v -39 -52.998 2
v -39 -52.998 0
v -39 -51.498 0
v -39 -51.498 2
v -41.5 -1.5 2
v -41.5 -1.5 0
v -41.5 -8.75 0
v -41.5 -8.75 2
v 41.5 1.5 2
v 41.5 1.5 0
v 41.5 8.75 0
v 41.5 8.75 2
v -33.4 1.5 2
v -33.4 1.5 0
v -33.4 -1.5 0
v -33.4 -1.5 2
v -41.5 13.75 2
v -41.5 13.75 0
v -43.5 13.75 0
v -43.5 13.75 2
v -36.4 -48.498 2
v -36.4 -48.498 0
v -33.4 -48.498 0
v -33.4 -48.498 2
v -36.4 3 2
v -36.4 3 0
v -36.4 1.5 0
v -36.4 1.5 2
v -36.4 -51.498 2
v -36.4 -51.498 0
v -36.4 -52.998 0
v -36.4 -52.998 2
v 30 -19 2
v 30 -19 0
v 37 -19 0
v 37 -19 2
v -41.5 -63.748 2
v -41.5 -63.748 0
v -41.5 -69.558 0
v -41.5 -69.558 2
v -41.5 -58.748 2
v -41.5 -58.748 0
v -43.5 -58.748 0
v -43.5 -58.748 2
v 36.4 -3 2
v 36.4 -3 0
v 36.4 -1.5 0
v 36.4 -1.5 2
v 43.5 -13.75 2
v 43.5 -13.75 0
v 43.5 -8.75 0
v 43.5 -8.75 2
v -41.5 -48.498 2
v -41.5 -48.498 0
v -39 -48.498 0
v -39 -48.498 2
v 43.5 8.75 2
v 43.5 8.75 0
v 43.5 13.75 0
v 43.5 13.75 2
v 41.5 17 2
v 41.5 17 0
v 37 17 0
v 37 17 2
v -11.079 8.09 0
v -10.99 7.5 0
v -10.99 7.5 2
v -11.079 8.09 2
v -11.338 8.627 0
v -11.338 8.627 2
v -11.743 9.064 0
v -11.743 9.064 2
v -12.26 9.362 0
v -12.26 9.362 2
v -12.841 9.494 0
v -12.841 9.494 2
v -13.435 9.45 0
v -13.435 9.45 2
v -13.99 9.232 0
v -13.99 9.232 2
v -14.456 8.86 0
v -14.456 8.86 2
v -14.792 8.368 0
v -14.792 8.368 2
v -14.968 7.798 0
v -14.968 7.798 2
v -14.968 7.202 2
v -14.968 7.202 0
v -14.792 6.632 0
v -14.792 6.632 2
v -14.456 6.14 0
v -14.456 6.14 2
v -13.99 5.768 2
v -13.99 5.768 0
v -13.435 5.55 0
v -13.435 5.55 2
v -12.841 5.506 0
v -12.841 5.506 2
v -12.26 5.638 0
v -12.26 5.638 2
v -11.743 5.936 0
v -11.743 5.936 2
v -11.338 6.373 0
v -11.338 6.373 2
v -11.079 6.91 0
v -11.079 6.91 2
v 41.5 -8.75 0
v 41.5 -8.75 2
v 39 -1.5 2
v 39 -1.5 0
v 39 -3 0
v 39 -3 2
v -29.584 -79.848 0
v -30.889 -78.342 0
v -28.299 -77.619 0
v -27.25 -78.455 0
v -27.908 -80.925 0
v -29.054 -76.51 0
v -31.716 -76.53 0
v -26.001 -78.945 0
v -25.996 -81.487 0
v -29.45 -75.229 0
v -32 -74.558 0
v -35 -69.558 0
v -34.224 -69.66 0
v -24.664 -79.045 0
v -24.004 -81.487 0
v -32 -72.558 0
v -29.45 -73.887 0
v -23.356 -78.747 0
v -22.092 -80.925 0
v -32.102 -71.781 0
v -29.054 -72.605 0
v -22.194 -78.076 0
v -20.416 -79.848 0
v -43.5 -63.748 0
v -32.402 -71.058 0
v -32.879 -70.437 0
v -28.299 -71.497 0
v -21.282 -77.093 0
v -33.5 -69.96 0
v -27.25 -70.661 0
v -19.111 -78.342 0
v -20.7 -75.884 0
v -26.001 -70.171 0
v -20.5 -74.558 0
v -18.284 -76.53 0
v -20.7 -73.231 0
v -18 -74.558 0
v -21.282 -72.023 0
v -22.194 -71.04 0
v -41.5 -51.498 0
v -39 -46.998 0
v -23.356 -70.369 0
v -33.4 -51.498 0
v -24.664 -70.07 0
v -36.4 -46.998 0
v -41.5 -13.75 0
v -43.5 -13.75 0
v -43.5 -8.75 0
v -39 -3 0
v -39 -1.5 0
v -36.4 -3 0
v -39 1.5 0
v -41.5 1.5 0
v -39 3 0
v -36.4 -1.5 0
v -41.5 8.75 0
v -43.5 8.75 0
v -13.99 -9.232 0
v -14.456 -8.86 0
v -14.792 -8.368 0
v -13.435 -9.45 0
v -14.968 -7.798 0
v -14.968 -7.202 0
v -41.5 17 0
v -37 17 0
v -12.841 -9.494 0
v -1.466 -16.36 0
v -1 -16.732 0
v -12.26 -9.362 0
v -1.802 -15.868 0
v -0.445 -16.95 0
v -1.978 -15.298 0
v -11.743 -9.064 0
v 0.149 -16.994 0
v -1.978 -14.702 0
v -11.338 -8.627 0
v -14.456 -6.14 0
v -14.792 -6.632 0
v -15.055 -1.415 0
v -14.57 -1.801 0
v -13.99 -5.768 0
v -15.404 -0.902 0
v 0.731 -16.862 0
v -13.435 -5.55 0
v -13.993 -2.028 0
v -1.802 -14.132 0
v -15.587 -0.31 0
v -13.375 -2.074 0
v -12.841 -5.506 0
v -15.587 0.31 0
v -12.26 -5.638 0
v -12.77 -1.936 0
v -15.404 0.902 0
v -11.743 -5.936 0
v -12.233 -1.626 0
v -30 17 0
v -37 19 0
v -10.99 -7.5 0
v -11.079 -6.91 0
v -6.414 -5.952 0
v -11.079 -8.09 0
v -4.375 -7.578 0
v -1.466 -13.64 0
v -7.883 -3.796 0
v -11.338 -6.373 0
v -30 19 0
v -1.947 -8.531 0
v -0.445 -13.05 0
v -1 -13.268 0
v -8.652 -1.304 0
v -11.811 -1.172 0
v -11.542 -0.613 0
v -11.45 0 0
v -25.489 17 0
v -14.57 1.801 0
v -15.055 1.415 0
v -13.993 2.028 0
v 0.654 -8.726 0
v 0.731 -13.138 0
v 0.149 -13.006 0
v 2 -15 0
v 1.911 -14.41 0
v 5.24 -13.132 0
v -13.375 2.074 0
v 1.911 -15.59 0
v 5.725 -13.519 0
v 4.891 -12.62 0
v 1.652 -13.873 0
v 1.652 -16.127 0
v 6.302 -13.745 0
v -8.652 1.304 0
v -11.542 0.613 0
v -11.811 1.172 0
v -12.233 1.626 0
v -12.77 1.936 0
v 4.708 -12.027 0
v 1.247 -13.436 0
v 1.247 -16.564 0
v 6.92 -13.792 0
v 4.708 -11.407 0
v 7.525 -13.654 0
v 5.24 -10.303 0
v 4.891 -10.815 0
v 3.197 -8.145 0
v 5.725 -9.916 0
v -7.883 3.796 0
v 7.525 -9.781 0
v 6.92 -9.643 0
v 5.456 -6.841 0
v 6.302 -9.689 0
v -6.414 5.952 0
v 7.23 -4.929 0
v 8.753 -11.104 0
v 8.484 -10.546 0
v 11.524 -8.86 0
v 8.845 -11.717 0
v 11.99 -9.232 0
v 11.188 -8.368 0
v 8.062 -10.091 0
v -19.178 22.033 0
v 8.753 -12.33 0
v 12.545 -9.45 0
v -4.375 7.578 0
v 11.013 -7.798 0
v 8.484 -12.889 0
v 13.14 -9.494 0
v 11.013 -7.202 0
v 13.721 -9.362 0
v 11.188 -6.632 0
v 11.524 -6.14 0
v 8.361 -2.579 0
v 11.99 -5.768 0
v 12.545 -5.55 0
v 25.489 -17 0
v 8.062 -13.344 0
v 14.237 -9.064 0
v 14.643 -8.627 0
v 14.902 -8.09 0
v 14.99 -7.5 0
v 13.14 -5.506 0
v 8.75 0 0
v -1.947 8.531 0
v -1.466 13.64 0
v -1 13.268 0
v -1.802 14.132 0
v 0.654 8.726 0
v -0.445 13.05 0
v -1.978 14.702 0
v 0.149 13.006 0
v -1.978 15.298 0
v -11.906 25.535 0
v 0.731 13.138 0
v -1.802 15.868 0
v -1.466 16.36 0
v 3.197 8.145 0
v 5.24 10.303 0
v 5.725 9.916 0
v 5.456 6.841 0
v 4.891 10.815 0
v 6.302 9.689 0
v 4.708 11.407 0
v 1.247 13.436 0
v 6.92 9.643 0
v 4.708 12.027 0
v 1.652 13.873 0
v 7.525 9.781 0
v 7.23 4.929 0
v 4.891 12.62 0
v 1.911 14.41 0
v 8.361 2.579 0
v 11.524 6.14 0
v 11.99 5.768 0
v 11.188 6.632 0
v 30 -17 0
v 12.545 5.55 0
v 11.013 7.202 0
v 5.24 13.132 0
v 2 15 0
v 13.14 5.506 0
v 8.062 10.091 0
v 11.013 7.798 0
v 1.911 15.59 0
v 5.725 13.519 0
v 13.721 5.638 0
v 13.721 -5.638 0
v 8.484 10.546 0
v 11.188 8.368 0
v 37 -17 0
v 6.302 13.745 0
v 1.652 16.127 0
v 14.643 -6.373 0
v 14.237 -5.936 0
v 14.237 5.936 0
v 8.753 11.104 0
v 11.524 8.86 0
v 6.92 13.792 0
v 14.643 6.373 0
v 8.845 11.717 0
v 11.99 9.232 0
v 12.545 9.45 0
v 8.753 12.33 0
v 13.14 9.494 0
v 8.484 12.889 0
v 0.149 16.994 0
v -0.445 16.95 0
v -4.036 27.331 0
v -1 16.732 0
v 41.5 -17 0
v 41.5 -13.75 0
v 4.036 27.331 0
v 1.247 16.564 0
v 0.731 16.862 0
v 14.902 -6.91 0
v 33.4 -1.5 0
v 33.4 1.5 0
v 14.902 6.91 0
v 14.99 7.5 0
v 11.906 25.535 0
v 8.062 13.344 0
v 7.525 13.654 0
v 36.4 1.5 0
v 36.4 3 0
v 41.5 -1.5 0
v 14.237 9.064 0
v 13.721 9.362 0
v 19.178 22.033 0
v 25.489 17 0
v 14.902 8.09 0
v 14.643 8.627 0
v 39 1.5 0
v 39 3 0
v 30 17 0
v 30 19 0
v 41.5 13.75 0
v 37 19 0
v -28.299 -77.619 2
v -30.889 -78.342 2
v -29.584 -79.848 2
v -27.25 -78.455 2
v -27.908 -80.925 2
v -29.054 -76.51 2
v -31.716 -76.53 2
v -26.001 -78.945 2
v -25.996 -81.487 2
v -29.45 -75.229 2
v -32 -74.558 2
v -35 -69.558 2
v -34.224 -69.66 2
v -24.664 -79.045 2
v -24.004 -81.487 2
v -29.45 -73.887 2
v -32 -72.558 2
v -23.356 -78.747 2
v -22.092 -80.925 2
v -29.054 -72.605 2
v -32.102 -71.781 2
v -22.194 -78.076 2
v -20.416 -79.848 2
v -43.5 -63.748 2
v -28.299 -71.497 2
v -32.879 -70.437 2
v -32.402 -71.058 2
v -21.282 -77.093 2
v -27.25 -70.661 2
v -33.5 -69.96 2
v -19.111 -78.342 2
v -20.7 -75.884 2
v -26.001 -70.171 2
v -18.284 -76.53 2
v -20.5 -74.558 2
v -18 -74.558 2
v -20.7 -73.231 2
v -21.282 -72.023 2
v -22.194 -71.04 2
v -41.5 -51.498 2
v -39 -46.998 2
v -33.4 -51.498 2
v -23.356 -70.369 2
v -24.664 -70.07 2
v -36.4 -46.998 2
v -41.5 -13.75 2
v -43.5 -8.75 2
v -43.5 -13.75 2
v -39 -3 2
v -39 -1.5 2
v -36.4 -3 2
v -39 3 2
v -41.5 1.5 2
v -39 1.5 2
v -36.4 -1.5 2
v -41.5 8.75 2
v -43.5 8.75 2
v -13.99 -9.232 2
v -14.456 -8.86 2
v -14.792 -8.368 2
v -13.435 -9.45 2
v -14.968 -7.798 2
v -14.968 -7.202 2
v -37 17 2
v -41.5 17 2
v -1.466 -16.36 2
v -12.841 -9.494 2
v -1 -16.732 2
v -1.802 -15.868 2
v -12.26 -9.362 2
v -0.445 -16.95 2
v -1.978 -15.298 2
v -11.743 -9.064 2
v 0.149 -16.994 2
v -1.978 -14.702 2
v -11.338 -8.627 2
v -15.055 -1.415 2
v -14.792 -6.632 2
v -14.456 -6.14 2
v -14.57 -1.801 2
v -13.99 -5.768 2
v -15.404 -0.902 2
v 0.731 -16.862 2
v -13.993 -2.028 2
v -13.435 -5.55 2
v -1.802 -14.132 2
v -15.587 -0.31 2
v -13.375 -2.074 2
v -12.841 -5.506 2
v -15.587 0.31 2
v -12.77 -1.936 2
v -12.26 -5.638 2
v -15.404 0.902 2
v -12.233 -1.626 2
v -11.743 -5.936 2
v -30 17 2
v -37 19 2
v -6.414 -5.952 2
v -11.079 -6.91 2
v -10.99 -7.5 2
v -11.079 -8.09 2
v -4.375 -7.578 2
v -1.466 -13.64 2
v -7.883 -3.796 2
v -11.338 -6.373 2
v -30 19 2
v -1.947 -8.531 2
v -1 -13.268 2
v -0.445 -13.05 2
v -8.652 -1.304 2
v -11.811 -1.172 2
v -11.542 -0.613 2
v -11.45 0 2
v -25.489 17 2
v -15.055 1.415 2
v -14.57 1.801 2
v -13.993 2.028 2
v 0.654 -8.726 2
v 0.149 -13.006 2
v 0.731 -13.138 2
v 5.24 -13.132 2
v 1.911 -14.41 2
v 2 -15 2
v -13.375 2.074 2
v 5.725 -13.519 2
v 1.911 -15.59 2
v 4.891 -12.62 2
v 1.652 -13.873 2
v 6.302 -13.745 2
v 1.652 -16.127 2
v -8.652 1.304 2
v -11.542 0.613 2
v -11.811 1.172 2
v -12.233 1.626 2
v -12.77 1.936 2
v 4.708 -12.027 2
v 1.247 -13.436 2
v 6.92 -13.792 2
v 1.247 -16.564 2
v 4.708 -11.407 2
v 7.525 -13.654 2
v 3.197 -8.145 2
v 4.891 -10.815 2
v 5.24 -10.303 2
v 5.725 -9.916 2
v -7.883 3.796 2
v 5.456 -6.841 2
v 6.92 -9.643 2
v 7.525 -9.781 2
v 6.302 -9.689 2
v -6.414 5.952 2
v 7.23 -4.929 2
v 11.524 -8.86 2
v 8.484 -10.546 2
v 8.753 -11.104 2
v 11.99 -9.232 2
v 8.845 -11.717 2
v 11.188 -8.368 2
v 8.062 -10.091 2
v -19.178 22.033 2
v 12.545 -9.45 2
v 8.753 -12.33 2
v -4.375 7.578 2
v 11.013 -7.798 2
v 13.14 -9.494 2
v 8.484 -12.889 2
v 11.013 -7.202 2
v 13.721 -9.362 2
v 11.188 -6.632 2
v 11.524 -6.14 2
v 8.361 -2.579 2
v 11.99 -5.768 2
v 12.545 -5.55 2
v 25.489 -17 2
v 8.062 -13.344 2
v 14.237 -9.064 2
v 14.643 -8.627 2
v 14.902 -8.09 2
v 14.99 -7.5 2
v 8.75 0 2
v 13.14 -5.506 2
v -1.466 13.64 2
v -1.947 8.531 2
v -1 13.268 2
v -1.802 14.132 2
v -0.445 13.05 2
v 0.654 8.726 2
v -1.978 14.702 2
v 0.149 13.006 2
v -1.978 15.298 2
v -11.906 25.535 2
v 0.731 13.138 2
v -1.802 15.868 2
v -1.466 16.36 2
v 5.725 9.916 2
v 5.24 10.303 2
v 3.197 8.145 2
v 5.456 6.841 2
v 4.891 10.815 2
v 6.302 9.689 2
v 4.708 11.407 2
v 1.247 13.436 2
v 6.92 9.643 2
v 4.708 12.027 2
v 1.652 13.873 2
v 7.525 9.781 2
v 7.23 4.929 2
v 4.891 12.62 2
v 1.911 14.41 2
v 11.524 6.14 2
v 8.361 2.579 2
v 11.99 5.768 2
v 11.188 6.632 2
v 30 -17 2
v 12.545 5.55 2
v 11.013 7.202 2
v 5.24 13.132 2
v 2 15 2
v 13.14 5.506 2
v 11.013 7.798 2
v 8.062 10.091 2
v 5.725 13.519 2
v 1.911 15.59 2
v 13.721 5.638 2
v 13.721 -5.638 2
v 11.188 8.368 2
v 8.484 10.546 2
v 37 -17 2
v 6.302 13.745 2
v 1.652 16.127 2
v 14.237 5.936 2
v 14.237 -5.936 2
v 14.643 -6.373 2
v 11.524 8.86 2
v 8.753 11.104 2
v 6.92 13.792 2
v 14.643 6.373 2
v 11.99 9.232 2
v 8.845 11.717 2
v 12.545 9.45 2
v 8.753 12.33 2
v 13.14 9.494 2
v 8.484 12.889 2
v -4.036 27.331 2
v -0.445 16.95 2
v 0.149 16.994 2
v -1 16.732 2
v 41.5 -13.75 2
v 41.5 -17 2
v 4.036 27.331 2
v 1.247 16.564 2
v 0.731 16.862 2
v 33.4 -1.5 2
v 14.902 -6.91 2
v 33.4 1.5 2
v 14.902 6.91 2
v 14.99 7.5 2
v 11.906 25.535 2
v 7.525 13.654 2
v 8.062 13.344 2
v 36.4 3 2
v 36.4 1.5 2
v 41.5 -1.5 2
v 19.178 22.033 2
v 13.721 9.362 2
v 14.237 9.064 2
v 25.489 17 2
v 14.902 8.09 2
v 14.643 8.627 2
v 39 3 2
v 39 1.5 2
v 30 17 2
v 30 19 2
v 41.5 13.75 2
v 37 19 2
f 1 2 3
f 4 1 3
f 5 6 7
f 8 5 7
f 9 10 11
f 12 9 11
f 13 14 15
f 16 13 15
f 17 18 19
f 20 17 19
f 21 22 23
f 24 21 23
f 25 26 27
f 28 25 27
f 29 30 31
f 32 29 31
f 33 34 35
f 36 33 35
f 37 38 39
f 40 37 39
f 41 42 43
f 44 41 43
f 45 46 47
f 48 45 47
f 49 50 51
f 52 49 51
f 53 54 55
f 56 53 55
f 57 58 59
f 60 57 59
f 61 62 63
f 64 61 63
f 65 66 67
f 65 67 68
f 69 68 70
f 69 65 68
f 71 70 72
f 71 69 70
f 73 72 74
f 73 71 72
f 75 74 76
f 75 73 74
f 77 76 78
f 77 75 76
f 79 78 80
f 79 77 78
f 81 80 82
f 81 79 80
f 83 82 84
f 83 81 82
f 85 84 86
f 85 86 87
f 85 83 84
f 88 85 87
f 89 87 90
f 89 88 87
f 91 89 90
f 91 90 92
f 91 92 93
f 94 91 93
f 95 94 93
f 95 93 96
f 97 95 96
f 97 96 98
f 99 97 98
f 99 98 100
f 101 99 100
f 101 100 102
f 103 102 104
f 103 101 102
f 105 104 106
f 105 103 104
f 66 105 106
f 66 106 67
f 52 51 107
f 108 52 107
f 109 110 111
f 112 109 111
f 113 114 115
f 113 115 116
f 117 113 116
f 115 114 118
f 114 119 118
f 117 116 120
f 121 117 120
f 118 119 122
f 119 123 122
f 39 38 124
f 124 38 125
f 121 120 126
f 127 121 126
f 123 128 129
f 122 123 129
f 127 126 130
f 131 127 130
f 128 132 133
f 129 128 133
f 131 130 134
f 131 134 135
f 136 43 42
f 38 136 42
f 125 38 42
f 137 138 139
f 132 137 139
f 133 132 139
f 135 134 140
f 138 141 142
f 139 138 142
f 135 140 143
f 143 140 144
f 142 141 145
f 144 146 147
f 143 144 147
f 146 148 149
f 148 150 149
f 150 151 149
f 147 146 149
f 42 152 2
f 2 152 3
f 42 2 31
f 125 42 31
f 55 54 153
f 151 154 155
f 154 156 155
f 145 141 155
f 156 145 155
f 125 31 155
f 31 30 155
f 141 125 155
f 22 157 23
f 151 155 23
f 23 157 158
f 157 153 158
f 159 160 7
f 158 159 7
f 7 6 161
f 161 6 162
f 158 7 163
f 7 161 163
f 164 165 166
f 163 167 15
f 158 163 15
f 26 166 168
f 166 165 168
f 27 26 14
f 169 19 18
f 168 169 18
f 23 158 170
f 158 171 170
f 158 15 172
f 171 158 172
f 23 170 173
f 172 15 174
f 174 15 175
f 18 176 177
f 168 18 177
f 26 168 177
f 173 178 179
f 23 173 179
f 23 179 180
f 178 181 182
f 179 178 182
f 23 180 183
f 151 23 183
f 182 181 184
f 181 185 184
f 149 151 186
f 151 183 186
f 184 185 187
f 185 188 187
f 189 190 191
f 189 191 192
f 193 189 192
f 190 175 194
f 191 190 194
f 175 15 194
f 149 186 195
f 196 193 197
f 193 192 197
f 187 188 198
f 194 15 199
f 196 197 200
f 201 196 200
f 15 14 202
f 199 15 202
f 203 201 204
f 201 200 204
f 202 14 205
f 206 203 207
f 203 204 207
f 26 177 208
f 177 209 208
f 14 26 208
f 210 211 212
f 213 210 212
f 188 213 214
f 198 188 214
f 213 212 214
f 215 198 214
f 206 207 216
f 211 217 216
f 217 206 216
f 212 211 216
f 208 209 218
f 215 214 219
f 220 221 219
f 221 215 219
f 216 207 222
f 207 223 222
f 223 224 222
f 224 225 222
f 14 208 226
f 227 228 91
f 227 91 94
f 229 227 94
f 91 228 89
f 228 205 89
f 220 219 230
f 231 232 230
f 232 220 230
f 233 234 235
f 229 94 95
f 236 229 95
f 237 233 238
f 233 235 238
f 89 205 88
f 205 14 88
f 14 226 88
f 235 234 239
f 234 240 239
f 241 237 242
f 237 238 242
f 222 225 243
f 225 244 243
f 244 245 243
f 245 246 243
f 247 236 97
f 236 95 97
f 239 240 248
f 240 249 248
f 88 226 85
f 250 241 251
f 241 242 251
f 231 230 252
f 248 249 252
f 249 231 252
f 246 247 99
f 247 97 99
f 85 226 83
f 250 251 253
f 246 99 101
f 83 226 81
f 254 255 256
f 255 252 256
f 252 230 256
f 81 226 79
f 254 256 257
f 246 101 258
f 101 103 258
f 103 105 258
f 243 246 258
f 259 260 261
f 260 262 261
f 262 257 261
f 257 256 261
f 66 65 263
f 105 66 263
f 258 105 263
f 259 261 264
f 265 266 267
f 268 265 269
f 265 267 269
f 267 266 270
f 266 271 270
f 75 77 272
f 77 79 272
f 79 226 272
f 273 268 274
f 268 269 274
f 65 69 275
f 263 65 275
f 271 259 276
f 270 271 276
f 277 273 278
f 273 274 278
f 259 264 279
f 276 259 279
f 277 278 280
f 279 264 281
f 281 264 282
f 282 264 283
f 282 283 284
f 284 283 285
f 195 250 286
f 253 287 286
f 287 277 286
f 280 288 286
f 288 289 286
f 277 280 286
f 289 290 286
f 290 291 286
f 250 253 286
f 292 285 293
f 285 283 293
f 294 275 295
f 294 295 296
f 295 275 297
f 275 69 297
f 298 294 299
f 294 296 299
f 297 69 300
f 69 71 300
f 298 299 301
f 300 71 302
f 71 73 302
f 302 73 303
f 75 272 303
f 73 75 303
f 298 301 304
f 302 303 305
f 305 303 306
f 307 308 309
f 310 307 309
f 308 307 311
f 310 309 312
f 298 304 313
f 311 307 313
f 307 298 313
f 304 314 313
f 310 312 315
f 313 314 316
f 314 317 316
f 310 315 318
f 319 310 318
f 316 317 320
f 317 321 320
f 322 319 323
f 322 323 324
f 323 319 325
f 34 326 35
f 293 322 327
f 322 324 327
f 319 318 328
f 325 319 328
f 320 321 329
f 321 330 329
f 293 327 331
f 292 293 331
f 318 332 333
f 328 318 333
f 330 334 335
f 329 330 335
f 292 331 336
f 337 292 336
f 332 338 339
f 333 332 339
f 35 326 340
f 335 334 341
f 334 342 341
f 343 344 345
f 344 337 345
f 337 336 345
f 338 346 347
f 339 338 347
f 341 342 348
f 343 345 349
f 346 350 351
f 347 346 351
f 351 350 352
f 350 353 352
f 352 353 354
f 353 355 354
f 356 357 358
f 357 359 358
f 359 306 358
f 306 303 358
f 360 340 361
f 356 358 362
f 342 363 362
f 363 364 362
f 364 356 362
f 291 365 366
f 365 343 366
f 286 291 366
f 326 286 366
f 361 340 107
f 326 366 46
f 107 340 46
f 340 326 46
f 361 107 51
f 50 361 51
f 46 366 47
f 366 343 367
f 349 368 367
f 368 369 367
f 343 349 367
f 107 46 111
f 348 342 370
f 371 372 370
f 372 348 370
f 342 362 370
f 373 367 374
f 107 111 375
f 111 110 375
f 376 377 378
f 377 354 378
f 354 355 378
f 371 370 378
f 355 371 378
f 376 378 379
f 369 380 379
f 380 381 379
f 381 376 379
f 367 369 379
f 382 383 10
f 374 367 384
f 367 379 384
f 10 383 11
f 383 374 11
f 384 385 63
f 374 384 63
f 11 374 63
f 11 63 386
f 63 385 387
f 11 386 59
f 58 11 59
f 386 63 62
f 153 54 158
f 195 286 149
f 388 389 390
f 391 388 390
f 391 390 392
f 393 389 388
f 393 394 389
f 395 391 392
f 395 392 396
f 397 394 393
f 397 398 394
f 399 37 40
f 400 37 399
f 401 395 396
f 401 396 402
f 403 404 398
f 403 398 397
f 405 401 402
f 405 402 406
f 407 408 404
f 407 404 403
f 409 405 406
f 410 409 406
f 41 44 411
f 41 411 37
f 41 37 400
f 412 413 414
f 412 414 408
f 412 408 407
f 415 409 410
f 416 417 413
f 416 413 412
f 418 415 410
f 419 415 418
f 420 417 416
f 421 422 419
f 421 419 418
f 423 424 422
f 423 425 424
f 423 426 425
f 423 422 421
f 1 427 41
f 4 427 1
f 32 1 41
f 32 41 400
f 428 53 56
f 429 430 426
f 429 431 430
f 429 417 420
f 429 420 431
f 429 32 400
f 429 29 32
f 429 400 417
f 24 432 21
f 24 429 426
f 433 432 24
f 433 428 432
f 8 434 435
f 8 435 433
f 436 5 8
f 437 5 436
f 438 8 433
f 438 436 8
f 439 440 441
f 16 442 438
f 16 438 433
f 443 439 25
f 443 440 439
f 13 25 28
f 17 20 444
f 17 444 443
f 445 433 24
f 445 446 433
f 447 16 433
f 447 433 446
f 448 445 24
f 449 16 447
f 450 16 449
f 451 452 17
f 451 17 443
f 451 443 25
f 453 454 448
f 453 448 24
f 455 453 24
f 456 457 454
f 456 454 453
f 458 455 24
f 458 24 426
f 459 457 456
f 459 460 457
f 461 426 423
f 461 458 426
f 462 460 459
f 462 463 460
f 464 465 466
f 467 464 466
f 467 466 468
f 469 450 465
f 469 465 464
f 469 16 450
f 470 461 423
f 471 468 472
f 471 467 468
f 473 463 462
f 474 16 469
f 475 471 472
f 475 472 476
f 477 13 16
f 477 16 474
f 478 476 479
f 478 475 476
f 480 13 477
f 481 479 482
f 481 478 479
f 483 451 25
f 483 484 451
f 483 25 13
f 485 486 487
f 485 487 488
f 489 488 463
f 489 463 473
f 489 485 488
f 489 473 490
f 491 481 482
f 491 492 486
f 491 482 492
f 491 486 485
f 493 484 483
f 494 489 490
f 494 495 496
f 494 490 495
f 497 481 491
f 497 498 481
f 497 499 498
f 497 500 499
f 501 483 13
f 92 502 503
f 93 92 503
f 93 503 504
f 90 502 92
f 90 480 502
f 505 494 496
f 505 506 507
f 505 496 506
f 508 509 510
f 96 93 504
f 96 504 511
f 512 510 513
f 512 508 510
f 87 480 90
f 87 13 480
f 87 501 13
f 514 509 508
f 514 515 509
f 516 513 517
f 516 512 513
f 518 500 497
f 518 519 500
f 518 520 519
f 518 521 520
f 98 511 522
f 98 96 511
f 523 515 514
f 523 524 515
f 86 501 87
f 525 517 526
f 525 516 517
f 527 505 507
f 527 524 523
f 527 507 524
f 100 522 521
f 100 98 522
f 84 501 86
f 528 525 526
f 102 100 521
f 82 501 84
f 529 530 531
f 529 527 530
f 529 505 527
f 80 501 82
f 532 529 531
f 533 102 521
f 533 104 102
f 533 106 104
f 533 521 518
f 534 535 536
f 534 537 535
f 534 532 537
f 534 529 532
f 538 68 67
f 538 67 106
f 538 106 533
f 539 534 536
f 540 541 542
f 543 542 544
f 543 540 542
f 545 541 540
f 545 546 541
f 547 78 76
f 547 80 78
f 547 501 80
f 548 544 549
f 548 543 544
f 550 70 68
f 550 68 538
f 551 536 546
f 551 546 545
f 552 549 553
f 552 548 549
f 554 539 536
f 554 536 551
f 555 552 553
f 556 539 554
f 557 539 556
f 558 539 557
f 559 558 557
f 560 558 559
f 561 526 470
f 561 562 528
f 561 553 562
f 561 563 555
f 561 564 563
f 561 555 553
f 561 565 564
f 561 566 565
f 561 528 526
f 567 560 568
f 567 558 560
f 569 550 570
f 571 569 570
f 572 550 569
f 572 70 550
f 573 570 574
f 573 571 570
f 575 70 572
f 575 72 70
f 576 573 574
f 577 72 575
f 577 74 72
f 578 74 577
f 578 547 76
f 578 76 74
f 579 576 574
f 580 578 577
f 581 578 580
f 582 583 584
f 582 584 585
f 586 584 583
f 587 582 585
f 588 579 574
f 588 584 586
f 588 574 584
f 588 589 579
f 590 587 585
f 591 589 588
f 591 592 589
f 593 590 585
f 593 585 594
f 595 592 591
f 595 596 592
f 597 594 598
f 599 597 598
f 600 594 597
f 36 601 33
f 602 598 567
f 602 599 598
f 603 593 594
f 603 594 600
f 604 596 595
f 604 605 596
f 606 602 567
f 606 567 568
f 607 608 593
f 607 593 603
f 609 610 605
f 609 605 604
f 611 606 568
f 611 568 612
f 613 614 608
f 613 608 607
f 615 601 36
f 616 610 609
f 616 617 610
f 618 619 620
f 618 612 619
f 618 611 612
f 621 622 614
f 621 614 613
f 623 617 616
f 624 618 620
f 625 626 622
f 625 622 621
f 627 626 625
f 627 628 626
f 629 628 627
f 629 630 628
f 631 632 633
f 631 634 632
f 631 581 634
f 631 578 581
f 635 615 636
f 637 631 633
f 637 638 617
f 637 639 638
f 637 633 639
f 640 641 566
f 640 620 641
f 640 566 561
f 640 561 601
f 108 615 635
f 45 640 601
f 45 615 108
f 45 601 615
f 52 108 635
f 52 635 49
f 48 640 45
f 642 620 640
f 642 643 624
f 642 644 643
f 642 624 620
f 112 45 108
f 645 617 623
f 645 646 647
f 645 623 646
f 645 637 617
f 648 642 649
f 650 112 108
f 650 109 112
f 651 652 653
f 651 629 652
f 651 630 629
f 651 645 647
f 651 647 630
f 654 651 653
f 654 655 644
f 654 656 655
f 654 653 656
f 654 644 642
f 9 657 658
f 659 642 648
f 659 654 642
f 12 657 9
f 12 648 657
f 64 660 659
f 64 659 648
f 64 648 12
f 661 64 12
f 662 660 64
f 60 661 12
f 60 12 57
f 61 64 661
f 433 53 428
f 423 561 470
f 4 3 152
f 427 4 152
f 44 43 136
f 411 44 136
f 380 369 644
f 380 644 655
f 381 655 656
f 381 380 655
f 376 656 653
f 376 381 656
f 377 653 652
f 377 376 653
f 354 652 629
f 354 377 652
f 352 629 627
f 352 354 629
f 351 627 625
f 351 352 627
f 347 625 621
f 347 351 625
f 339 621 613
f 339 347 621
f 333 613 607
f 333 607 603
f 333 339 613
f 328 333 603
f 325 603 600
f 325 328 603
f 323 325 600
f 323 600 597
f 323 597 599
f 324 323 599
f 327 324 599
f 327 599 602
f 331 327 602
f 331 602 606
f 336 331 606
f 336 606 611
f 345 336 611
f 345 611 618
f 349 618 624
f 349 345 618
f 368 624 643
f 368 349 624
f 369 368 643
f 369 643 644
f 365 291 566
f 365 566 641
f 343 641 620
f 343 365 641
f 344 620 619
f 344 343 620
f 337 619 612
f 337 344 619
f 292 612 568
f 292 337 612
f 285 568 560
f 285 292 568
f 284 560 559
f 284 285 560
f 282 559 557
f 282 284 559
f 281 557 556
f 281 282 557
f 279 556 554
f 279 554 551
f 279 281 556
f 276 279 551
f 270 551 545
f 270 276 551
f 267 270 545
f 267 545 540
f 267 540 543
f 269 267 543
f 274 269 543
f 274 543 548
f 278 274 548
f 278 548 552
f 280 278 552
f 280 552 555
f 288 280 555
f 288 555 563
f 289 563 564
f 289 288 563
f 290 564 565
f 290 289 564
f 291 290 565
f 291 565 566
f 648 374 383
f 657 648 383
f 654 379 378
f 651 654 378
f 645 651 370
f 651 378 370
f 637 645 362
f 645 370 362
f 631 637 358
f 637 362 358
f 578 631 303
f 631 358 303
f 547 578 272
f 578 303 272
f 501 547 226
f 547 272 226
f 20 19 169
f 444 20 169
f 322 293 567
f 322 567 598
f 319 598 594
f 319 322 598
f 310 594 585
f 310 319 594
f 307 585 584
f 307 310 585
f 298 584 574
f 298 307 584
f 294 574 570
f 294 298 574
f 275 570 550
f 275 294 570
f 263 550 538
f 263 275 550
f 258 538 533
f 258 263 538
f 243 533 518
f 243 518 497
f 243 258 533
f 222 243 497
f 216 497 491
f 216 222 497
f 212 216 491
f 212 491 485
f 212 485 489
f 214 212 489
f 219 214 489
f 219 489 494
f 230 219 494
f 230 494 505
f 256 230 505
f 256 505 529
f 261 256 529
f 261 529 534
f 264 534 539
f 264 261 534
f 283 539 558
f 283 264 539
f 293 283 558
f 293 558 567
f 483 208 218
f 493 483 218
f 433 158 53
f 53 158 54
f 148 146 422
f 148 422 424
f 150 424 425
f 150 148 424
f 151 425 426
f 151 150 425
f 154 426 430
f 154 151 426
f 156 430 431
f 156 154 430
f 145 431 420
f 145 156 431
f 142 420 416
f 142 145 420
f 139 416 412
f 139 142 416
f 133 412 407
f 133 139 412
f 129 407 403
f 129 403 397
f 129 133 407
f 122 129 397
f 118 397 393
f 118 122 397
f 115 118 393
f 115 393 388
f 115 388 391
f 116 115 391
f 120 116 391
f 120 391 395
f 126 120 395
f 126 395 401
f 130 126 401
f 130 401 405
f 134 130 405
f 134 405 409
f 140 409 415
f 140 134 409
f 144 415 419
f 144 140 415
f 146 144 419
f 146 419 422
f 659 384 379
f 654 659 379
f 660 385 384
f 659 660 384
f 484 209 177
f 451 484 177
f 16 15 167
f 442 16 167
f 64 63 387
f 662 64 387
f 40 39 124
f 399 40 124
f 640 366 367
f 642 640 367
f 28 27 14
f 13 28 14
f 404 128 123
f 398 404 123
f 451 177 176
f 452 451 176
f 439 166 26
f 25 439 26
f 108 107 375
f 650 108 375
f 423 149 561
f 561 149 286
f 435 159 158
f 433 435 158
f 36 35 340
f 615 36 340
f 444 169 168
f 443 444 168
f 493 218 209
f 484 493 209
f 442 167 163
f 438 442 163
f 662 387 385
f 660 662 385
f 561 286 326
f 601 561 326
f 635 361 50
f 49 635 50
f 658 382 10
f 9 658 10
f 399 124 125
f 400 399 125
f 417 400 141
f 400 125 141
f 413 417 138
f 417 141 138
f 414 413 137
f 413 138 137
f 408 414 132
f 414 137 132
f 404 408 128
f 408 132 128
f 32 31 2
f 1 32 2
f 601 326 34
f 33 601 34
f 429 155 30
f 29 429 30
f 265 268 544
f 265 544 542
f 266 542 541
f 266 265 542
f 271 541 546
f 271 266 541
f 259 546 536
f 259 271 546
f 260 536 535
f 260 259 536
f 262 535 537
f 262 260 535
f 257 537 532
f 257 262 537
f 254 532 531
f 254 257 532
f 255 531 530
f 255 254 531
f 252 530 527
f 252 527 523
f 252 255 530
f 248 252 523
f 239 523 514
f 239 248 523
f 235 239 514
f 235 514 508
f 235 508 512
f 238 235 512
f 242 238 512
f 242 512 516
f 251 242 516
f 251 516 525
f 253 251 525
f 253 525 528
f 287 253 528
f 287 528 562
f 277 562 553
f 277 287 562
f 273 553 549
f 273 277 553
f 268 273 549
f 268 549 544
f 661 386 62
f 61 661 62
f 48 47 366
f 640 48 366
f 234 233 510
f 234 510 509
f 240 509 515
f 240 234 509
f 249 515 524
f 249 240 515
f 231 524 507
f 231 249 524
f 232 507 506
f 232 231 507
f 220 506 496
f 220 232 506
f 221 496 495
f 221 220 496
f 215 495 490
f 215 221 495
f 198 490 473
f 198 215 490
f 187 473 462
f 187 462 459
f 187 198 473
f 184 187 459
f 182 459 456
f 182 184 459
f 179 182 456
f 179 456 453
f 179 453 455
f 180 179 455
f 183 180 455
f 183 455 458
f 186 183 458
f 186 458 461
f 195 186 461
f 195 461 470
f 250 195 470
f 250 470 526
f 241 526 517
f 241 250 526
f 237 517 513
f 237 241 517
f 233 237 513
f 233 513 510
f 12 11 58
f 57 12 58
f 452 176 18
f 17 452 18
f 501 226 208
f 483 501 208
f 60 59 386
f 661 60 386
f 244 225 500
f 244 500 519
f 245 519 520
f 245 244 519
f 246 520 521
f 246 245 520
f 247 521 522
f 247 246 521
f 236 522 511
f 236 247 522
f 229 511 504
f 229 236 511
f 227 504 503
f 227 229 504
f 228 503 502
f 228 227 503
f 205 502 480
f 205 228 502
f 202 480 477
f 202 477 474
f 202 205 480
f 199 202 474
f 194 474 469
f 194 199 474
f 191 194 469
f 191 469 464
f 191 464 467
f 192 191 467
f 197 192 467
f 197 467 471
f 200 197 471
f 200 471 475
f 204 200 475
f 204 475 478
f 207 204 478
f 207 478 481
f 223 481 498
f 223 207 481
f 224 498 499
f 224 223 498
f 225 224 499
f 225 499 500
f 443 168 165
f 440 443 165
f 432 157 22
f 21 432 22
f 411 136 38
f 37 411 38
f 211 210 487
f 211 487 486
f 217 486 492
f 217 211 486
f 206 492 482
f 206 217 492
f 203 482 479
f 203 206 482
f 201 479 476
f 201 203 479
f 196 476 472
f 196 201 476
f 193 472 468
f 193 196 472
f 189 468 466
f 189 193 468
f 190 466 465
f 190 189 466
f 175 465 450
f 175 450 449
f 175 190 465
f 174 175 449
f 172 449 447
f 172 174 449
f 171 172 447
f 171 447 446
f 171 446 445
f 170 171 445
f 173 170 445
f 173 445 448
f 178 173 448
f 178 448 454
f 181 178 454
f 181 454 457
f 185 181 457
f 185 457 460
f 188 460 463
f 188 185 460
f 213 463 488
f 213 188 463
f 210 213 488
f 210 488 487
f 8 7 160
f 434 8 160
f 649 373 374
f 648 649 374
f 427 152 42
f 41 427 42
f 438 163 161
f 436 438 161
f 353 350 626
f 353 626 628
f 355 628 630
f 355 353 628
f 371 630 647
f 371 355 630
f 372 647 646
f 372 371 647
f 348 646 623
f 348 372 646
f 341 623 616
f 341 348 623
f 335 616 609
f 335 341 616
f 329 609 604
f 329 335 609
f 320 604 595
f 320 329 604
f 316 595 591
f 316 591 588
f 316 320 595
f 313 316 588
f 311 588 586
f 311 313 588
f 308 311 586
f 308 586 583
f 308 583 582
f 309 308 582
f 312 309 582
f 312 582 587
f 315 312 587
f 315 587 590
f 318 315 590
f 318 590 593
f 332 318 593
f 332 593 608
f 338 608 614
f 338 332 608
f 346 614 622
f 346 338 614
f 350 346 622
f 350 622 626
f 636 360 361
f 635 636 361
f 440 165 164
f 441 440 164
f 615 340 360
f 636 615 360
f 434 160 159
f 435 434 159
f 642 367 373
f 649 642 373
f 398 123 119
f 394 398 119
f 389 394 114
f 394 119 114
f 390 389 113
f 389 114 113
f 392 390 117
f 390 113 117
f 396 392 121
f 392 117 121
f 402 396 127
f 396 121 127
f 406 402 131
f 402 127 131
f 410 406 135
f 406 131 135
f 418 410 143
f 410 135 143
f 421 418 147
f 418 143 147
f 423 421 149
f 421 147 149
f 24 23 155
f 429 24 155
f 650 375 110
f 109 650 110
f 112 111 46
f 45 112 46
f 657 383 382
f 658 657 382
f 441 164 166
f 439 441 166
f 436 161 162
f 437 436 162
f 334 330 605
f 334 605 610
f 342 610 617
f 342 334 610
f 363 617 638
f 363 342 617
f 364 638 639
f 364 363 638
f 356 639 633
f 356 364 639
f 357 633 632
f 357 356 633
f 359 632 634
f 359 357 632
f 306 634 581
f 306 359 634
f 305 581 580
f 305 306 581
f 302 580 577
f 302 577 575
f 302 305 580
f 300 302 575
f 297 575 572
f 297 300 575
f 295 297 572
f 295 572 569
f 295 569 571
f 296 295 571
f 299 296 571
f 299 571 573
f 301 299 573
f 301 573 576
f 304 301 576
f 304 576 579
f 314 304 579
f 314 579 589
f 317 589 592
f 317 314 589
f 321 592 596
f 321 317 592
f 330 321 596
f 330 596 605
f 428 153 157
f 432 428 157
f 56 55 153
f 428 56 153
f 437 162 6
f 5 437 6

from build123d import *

# Parameters (mm, degrees)
SKETCH_1_R      = 2
SKETCH_1_R_2    = 2.08
SKETCH_1_R_3    = 8.75
SKETCH_1_R_4    = 4.5
EXTRUDE_2_DEPTH = 2


with BuildPart() as part:
    # 草图1 → 凸台-拉伸2 (new body)
    with BuildSketch(Plane.XY):
        with BuildLine():
            Line((41.5, 13.75), (41.5, 17))
            Line((41.5, 17), (37, 17))
            Line((37, 17), (37, 19))
            Line((37, 19), (30, 19))
            Line((30, 19), (30, 17))
            Line((30, 17), (25.488968202, 17))
            ThreePointArc((25.488968202, 17), (0, 27.55787632), (-25.488968202, 17))
            Line((-25.488968202, 17), (-30, 17))
            Line((-30, 17), (-30, 19))
            Line((-30, 19), (-37, 19))
            Line((-37, 19), (-37, 17))
            Line((-37, 17), (-41.5, 17))
            Line((-41.5, 17), (-41.5, 13.75))
            Line((-41.5, 13.75), (-43.5, 13.75))
            Line((-43.5, 13.75), (-43.5, 8.75))
            Line((-43.5, 8.75), (-41.5, 8.75))
            Line((-41.5, 8.75), (-41.5, 1.5))
            Line((-41.5, 1.5), (-39, 1.5))
            Line((-39, 1.5), (-39, 3))
            Line((-39, 3), (-36.4, 3))
            Line((-36.4, 3), (-36.4, 1.5))
            Line((-36.4, 1.5), (-33.4, 1.5))
            Line((-33.4, 1.5), (-33.4, -1.5))
            Line((-33.4, -1.5), (-36.4, -1.5))
            Line((-36.4, -1.5), (-36.4, -3))
            Line((-36.4, -3), (-39, -3))
            Line((-39, -3), (-39, -1.5))
            Line((-39, -1.5), (-41.5, -1.5))
            Line((-41.5, -1.5), (-41.5, -8.75))
            Line((-41.5, -8.75), (-43.5, -8.75))
            Line((-43.5, -8.75), (-43.5, -13.75))
            Line((-43.5, -13.75), (-41.5, -13.75))
            Line((-41.5, -13.75), (-41.5, -17))
            Line((-41.5, -17), (-41.5, -48.49787632))
            Line((-41.5, -48.49787632), (-39, -48.49787632))
            Line((-39, -48.49787632), (-39, -46.99787632))
            Line((-39, -46.99787632), (-36.4, -46.99787632))
            Line((-36.4, -46.99787632), (-36.4, -48.49787632))
            Line((-36.4, -48.49787632), (-33.4, -48.49787632))
            Line((-33.4, -48.49787632), (-33.4, -51.49787632))
            Line((-33.4, -51.49787632), (-36.4, -51.49787632))
            Line((-36.4, -51.49787632), (-36.4, -52.99787632))
            Line((-36.4, -52.99787632), (-39, -52.99787632))
            Line((-39, -52.99787632), (-39, -51.49787632))
            Line((-39, -51.49787632), (-41.5, -51.49787632))
            Line((-41.5, -51.49787632), (-41.5, -58.74787632))
            Line((-41.5, -58.74787632), (-43.5, -58.74787632))
            Line((-43.5, -58.74787632), (-43.5, -63.74787632))
            Line((-43.5, -63.74787632), (-41.5, -63.74787632))
            Line((-41.5, -63.74787632), (-41.5, -69.55787632))
            Line((-41.5, -69.55787632), (-35, -69.55787632))
            ThreePointArc((-35, -69.55787632), (-32.878679656, -70.436555977), (-32, -72.55787632))
            Line((-32, -72.55787632), (-32, -74.55787632))
            ThreePointArc((-32, -74.55787632), (-25, -81.55787632), (-18, -74.55787632))
            Line((-18, -74.55787632), (25.488968202, -17))
            Line((25.488968202, -17), (30, -17))
            Line((30, -17), (30, -19))
            Line((30, -19), (37, -19))
            Line((37, -19), (37, -17))
            Line((37, -17), (41.5, -17))
            Line((41.5, -17), (41.5, -13.75))
            Line((41.5, -13.75), (43.5, -13.75))
            Line((43.5, -13.75), (43.5, -8.75))
            Line((43.5, -8.75), (41.5, -8.75))
            Line((41.5, -8.75), (41.5, -1.5))
            Line((41.5, -1.5), (39, -1.5))
            Line((39, -1.5), (39, -3))
            Line((39, -3), (36.4, -3))
            Line((36.4, -3), (36.4, -1.5))
            Line((36.4, -1.5), (33.4, -1.5))
            Line((33.4, -1.5), (33.4, 1.5))
            Line((33.4, 1.5), (36.4, 1.5))
            Line((36.4, 1.5), (36.4, 3))
            Line((36.4, 3), (39, 3))
            Line((39, 3), (39, 1.5))
            Line((39, 1.5), (41.5, 1.5))
            Line((41.5, 1.5), (41.5, 8.75))
            Line((41.5, 8.75), (43.5, 8.75))
            Line((43.5, 8.75), (43.5, 13.75))
            Line((43.5, 13.75), (41.5, 13.75))
        make_face()
        with Locations((0, -15)):
            Circle(SKETCH_1_R, mode=Mode.SUBTRACT)
        with Locations((-12.990381057, -7.5)):
            Circle(SKETCH_1_R, mode=Mode.SUBTRACT)
        with Locations((-12.990381057, 7.5)):
            Circle(SKETCH_1_R, mode=Mode.SUBTRACT)
        with Locations((0, 15)):
            Circle(SKETCH_1_R, mode=Mode.SUBTRACT)
        with Locations((12.990381057, 7.5)):
            Circle(SKETCH_1_R, mode=Mode.SUBTRACT)
        with Locations((12.990381057, -7.5)):
            Circle(SKETCH_1_R, mode=Mode.SUBTRACT)
        with Locations((-13.53, 0)):
            Circle(SKETCH_1_R_2, mode=Mode.SUBTRACT)
        with Locations((6.765, 11.717323713)):
            Circle(SKETCH_1_R_2, mode=Mode.SUBTRACT)
        with Locations((6.765, -11.717323713)):
            Circle(SKETCH_1_R_2, mode=Mode.SUBTRACT)
        Circle(SKETCH_1_R_3, mode=Mode.SUBTRACT)
        with Locations((-25, -74.55787632)):
            Circle(SKETCH_1_R_4, mode=Mode.SUBTRACT)
    extrude(amount=EXTRUDE_2_DEPTH)


solid = part.part
